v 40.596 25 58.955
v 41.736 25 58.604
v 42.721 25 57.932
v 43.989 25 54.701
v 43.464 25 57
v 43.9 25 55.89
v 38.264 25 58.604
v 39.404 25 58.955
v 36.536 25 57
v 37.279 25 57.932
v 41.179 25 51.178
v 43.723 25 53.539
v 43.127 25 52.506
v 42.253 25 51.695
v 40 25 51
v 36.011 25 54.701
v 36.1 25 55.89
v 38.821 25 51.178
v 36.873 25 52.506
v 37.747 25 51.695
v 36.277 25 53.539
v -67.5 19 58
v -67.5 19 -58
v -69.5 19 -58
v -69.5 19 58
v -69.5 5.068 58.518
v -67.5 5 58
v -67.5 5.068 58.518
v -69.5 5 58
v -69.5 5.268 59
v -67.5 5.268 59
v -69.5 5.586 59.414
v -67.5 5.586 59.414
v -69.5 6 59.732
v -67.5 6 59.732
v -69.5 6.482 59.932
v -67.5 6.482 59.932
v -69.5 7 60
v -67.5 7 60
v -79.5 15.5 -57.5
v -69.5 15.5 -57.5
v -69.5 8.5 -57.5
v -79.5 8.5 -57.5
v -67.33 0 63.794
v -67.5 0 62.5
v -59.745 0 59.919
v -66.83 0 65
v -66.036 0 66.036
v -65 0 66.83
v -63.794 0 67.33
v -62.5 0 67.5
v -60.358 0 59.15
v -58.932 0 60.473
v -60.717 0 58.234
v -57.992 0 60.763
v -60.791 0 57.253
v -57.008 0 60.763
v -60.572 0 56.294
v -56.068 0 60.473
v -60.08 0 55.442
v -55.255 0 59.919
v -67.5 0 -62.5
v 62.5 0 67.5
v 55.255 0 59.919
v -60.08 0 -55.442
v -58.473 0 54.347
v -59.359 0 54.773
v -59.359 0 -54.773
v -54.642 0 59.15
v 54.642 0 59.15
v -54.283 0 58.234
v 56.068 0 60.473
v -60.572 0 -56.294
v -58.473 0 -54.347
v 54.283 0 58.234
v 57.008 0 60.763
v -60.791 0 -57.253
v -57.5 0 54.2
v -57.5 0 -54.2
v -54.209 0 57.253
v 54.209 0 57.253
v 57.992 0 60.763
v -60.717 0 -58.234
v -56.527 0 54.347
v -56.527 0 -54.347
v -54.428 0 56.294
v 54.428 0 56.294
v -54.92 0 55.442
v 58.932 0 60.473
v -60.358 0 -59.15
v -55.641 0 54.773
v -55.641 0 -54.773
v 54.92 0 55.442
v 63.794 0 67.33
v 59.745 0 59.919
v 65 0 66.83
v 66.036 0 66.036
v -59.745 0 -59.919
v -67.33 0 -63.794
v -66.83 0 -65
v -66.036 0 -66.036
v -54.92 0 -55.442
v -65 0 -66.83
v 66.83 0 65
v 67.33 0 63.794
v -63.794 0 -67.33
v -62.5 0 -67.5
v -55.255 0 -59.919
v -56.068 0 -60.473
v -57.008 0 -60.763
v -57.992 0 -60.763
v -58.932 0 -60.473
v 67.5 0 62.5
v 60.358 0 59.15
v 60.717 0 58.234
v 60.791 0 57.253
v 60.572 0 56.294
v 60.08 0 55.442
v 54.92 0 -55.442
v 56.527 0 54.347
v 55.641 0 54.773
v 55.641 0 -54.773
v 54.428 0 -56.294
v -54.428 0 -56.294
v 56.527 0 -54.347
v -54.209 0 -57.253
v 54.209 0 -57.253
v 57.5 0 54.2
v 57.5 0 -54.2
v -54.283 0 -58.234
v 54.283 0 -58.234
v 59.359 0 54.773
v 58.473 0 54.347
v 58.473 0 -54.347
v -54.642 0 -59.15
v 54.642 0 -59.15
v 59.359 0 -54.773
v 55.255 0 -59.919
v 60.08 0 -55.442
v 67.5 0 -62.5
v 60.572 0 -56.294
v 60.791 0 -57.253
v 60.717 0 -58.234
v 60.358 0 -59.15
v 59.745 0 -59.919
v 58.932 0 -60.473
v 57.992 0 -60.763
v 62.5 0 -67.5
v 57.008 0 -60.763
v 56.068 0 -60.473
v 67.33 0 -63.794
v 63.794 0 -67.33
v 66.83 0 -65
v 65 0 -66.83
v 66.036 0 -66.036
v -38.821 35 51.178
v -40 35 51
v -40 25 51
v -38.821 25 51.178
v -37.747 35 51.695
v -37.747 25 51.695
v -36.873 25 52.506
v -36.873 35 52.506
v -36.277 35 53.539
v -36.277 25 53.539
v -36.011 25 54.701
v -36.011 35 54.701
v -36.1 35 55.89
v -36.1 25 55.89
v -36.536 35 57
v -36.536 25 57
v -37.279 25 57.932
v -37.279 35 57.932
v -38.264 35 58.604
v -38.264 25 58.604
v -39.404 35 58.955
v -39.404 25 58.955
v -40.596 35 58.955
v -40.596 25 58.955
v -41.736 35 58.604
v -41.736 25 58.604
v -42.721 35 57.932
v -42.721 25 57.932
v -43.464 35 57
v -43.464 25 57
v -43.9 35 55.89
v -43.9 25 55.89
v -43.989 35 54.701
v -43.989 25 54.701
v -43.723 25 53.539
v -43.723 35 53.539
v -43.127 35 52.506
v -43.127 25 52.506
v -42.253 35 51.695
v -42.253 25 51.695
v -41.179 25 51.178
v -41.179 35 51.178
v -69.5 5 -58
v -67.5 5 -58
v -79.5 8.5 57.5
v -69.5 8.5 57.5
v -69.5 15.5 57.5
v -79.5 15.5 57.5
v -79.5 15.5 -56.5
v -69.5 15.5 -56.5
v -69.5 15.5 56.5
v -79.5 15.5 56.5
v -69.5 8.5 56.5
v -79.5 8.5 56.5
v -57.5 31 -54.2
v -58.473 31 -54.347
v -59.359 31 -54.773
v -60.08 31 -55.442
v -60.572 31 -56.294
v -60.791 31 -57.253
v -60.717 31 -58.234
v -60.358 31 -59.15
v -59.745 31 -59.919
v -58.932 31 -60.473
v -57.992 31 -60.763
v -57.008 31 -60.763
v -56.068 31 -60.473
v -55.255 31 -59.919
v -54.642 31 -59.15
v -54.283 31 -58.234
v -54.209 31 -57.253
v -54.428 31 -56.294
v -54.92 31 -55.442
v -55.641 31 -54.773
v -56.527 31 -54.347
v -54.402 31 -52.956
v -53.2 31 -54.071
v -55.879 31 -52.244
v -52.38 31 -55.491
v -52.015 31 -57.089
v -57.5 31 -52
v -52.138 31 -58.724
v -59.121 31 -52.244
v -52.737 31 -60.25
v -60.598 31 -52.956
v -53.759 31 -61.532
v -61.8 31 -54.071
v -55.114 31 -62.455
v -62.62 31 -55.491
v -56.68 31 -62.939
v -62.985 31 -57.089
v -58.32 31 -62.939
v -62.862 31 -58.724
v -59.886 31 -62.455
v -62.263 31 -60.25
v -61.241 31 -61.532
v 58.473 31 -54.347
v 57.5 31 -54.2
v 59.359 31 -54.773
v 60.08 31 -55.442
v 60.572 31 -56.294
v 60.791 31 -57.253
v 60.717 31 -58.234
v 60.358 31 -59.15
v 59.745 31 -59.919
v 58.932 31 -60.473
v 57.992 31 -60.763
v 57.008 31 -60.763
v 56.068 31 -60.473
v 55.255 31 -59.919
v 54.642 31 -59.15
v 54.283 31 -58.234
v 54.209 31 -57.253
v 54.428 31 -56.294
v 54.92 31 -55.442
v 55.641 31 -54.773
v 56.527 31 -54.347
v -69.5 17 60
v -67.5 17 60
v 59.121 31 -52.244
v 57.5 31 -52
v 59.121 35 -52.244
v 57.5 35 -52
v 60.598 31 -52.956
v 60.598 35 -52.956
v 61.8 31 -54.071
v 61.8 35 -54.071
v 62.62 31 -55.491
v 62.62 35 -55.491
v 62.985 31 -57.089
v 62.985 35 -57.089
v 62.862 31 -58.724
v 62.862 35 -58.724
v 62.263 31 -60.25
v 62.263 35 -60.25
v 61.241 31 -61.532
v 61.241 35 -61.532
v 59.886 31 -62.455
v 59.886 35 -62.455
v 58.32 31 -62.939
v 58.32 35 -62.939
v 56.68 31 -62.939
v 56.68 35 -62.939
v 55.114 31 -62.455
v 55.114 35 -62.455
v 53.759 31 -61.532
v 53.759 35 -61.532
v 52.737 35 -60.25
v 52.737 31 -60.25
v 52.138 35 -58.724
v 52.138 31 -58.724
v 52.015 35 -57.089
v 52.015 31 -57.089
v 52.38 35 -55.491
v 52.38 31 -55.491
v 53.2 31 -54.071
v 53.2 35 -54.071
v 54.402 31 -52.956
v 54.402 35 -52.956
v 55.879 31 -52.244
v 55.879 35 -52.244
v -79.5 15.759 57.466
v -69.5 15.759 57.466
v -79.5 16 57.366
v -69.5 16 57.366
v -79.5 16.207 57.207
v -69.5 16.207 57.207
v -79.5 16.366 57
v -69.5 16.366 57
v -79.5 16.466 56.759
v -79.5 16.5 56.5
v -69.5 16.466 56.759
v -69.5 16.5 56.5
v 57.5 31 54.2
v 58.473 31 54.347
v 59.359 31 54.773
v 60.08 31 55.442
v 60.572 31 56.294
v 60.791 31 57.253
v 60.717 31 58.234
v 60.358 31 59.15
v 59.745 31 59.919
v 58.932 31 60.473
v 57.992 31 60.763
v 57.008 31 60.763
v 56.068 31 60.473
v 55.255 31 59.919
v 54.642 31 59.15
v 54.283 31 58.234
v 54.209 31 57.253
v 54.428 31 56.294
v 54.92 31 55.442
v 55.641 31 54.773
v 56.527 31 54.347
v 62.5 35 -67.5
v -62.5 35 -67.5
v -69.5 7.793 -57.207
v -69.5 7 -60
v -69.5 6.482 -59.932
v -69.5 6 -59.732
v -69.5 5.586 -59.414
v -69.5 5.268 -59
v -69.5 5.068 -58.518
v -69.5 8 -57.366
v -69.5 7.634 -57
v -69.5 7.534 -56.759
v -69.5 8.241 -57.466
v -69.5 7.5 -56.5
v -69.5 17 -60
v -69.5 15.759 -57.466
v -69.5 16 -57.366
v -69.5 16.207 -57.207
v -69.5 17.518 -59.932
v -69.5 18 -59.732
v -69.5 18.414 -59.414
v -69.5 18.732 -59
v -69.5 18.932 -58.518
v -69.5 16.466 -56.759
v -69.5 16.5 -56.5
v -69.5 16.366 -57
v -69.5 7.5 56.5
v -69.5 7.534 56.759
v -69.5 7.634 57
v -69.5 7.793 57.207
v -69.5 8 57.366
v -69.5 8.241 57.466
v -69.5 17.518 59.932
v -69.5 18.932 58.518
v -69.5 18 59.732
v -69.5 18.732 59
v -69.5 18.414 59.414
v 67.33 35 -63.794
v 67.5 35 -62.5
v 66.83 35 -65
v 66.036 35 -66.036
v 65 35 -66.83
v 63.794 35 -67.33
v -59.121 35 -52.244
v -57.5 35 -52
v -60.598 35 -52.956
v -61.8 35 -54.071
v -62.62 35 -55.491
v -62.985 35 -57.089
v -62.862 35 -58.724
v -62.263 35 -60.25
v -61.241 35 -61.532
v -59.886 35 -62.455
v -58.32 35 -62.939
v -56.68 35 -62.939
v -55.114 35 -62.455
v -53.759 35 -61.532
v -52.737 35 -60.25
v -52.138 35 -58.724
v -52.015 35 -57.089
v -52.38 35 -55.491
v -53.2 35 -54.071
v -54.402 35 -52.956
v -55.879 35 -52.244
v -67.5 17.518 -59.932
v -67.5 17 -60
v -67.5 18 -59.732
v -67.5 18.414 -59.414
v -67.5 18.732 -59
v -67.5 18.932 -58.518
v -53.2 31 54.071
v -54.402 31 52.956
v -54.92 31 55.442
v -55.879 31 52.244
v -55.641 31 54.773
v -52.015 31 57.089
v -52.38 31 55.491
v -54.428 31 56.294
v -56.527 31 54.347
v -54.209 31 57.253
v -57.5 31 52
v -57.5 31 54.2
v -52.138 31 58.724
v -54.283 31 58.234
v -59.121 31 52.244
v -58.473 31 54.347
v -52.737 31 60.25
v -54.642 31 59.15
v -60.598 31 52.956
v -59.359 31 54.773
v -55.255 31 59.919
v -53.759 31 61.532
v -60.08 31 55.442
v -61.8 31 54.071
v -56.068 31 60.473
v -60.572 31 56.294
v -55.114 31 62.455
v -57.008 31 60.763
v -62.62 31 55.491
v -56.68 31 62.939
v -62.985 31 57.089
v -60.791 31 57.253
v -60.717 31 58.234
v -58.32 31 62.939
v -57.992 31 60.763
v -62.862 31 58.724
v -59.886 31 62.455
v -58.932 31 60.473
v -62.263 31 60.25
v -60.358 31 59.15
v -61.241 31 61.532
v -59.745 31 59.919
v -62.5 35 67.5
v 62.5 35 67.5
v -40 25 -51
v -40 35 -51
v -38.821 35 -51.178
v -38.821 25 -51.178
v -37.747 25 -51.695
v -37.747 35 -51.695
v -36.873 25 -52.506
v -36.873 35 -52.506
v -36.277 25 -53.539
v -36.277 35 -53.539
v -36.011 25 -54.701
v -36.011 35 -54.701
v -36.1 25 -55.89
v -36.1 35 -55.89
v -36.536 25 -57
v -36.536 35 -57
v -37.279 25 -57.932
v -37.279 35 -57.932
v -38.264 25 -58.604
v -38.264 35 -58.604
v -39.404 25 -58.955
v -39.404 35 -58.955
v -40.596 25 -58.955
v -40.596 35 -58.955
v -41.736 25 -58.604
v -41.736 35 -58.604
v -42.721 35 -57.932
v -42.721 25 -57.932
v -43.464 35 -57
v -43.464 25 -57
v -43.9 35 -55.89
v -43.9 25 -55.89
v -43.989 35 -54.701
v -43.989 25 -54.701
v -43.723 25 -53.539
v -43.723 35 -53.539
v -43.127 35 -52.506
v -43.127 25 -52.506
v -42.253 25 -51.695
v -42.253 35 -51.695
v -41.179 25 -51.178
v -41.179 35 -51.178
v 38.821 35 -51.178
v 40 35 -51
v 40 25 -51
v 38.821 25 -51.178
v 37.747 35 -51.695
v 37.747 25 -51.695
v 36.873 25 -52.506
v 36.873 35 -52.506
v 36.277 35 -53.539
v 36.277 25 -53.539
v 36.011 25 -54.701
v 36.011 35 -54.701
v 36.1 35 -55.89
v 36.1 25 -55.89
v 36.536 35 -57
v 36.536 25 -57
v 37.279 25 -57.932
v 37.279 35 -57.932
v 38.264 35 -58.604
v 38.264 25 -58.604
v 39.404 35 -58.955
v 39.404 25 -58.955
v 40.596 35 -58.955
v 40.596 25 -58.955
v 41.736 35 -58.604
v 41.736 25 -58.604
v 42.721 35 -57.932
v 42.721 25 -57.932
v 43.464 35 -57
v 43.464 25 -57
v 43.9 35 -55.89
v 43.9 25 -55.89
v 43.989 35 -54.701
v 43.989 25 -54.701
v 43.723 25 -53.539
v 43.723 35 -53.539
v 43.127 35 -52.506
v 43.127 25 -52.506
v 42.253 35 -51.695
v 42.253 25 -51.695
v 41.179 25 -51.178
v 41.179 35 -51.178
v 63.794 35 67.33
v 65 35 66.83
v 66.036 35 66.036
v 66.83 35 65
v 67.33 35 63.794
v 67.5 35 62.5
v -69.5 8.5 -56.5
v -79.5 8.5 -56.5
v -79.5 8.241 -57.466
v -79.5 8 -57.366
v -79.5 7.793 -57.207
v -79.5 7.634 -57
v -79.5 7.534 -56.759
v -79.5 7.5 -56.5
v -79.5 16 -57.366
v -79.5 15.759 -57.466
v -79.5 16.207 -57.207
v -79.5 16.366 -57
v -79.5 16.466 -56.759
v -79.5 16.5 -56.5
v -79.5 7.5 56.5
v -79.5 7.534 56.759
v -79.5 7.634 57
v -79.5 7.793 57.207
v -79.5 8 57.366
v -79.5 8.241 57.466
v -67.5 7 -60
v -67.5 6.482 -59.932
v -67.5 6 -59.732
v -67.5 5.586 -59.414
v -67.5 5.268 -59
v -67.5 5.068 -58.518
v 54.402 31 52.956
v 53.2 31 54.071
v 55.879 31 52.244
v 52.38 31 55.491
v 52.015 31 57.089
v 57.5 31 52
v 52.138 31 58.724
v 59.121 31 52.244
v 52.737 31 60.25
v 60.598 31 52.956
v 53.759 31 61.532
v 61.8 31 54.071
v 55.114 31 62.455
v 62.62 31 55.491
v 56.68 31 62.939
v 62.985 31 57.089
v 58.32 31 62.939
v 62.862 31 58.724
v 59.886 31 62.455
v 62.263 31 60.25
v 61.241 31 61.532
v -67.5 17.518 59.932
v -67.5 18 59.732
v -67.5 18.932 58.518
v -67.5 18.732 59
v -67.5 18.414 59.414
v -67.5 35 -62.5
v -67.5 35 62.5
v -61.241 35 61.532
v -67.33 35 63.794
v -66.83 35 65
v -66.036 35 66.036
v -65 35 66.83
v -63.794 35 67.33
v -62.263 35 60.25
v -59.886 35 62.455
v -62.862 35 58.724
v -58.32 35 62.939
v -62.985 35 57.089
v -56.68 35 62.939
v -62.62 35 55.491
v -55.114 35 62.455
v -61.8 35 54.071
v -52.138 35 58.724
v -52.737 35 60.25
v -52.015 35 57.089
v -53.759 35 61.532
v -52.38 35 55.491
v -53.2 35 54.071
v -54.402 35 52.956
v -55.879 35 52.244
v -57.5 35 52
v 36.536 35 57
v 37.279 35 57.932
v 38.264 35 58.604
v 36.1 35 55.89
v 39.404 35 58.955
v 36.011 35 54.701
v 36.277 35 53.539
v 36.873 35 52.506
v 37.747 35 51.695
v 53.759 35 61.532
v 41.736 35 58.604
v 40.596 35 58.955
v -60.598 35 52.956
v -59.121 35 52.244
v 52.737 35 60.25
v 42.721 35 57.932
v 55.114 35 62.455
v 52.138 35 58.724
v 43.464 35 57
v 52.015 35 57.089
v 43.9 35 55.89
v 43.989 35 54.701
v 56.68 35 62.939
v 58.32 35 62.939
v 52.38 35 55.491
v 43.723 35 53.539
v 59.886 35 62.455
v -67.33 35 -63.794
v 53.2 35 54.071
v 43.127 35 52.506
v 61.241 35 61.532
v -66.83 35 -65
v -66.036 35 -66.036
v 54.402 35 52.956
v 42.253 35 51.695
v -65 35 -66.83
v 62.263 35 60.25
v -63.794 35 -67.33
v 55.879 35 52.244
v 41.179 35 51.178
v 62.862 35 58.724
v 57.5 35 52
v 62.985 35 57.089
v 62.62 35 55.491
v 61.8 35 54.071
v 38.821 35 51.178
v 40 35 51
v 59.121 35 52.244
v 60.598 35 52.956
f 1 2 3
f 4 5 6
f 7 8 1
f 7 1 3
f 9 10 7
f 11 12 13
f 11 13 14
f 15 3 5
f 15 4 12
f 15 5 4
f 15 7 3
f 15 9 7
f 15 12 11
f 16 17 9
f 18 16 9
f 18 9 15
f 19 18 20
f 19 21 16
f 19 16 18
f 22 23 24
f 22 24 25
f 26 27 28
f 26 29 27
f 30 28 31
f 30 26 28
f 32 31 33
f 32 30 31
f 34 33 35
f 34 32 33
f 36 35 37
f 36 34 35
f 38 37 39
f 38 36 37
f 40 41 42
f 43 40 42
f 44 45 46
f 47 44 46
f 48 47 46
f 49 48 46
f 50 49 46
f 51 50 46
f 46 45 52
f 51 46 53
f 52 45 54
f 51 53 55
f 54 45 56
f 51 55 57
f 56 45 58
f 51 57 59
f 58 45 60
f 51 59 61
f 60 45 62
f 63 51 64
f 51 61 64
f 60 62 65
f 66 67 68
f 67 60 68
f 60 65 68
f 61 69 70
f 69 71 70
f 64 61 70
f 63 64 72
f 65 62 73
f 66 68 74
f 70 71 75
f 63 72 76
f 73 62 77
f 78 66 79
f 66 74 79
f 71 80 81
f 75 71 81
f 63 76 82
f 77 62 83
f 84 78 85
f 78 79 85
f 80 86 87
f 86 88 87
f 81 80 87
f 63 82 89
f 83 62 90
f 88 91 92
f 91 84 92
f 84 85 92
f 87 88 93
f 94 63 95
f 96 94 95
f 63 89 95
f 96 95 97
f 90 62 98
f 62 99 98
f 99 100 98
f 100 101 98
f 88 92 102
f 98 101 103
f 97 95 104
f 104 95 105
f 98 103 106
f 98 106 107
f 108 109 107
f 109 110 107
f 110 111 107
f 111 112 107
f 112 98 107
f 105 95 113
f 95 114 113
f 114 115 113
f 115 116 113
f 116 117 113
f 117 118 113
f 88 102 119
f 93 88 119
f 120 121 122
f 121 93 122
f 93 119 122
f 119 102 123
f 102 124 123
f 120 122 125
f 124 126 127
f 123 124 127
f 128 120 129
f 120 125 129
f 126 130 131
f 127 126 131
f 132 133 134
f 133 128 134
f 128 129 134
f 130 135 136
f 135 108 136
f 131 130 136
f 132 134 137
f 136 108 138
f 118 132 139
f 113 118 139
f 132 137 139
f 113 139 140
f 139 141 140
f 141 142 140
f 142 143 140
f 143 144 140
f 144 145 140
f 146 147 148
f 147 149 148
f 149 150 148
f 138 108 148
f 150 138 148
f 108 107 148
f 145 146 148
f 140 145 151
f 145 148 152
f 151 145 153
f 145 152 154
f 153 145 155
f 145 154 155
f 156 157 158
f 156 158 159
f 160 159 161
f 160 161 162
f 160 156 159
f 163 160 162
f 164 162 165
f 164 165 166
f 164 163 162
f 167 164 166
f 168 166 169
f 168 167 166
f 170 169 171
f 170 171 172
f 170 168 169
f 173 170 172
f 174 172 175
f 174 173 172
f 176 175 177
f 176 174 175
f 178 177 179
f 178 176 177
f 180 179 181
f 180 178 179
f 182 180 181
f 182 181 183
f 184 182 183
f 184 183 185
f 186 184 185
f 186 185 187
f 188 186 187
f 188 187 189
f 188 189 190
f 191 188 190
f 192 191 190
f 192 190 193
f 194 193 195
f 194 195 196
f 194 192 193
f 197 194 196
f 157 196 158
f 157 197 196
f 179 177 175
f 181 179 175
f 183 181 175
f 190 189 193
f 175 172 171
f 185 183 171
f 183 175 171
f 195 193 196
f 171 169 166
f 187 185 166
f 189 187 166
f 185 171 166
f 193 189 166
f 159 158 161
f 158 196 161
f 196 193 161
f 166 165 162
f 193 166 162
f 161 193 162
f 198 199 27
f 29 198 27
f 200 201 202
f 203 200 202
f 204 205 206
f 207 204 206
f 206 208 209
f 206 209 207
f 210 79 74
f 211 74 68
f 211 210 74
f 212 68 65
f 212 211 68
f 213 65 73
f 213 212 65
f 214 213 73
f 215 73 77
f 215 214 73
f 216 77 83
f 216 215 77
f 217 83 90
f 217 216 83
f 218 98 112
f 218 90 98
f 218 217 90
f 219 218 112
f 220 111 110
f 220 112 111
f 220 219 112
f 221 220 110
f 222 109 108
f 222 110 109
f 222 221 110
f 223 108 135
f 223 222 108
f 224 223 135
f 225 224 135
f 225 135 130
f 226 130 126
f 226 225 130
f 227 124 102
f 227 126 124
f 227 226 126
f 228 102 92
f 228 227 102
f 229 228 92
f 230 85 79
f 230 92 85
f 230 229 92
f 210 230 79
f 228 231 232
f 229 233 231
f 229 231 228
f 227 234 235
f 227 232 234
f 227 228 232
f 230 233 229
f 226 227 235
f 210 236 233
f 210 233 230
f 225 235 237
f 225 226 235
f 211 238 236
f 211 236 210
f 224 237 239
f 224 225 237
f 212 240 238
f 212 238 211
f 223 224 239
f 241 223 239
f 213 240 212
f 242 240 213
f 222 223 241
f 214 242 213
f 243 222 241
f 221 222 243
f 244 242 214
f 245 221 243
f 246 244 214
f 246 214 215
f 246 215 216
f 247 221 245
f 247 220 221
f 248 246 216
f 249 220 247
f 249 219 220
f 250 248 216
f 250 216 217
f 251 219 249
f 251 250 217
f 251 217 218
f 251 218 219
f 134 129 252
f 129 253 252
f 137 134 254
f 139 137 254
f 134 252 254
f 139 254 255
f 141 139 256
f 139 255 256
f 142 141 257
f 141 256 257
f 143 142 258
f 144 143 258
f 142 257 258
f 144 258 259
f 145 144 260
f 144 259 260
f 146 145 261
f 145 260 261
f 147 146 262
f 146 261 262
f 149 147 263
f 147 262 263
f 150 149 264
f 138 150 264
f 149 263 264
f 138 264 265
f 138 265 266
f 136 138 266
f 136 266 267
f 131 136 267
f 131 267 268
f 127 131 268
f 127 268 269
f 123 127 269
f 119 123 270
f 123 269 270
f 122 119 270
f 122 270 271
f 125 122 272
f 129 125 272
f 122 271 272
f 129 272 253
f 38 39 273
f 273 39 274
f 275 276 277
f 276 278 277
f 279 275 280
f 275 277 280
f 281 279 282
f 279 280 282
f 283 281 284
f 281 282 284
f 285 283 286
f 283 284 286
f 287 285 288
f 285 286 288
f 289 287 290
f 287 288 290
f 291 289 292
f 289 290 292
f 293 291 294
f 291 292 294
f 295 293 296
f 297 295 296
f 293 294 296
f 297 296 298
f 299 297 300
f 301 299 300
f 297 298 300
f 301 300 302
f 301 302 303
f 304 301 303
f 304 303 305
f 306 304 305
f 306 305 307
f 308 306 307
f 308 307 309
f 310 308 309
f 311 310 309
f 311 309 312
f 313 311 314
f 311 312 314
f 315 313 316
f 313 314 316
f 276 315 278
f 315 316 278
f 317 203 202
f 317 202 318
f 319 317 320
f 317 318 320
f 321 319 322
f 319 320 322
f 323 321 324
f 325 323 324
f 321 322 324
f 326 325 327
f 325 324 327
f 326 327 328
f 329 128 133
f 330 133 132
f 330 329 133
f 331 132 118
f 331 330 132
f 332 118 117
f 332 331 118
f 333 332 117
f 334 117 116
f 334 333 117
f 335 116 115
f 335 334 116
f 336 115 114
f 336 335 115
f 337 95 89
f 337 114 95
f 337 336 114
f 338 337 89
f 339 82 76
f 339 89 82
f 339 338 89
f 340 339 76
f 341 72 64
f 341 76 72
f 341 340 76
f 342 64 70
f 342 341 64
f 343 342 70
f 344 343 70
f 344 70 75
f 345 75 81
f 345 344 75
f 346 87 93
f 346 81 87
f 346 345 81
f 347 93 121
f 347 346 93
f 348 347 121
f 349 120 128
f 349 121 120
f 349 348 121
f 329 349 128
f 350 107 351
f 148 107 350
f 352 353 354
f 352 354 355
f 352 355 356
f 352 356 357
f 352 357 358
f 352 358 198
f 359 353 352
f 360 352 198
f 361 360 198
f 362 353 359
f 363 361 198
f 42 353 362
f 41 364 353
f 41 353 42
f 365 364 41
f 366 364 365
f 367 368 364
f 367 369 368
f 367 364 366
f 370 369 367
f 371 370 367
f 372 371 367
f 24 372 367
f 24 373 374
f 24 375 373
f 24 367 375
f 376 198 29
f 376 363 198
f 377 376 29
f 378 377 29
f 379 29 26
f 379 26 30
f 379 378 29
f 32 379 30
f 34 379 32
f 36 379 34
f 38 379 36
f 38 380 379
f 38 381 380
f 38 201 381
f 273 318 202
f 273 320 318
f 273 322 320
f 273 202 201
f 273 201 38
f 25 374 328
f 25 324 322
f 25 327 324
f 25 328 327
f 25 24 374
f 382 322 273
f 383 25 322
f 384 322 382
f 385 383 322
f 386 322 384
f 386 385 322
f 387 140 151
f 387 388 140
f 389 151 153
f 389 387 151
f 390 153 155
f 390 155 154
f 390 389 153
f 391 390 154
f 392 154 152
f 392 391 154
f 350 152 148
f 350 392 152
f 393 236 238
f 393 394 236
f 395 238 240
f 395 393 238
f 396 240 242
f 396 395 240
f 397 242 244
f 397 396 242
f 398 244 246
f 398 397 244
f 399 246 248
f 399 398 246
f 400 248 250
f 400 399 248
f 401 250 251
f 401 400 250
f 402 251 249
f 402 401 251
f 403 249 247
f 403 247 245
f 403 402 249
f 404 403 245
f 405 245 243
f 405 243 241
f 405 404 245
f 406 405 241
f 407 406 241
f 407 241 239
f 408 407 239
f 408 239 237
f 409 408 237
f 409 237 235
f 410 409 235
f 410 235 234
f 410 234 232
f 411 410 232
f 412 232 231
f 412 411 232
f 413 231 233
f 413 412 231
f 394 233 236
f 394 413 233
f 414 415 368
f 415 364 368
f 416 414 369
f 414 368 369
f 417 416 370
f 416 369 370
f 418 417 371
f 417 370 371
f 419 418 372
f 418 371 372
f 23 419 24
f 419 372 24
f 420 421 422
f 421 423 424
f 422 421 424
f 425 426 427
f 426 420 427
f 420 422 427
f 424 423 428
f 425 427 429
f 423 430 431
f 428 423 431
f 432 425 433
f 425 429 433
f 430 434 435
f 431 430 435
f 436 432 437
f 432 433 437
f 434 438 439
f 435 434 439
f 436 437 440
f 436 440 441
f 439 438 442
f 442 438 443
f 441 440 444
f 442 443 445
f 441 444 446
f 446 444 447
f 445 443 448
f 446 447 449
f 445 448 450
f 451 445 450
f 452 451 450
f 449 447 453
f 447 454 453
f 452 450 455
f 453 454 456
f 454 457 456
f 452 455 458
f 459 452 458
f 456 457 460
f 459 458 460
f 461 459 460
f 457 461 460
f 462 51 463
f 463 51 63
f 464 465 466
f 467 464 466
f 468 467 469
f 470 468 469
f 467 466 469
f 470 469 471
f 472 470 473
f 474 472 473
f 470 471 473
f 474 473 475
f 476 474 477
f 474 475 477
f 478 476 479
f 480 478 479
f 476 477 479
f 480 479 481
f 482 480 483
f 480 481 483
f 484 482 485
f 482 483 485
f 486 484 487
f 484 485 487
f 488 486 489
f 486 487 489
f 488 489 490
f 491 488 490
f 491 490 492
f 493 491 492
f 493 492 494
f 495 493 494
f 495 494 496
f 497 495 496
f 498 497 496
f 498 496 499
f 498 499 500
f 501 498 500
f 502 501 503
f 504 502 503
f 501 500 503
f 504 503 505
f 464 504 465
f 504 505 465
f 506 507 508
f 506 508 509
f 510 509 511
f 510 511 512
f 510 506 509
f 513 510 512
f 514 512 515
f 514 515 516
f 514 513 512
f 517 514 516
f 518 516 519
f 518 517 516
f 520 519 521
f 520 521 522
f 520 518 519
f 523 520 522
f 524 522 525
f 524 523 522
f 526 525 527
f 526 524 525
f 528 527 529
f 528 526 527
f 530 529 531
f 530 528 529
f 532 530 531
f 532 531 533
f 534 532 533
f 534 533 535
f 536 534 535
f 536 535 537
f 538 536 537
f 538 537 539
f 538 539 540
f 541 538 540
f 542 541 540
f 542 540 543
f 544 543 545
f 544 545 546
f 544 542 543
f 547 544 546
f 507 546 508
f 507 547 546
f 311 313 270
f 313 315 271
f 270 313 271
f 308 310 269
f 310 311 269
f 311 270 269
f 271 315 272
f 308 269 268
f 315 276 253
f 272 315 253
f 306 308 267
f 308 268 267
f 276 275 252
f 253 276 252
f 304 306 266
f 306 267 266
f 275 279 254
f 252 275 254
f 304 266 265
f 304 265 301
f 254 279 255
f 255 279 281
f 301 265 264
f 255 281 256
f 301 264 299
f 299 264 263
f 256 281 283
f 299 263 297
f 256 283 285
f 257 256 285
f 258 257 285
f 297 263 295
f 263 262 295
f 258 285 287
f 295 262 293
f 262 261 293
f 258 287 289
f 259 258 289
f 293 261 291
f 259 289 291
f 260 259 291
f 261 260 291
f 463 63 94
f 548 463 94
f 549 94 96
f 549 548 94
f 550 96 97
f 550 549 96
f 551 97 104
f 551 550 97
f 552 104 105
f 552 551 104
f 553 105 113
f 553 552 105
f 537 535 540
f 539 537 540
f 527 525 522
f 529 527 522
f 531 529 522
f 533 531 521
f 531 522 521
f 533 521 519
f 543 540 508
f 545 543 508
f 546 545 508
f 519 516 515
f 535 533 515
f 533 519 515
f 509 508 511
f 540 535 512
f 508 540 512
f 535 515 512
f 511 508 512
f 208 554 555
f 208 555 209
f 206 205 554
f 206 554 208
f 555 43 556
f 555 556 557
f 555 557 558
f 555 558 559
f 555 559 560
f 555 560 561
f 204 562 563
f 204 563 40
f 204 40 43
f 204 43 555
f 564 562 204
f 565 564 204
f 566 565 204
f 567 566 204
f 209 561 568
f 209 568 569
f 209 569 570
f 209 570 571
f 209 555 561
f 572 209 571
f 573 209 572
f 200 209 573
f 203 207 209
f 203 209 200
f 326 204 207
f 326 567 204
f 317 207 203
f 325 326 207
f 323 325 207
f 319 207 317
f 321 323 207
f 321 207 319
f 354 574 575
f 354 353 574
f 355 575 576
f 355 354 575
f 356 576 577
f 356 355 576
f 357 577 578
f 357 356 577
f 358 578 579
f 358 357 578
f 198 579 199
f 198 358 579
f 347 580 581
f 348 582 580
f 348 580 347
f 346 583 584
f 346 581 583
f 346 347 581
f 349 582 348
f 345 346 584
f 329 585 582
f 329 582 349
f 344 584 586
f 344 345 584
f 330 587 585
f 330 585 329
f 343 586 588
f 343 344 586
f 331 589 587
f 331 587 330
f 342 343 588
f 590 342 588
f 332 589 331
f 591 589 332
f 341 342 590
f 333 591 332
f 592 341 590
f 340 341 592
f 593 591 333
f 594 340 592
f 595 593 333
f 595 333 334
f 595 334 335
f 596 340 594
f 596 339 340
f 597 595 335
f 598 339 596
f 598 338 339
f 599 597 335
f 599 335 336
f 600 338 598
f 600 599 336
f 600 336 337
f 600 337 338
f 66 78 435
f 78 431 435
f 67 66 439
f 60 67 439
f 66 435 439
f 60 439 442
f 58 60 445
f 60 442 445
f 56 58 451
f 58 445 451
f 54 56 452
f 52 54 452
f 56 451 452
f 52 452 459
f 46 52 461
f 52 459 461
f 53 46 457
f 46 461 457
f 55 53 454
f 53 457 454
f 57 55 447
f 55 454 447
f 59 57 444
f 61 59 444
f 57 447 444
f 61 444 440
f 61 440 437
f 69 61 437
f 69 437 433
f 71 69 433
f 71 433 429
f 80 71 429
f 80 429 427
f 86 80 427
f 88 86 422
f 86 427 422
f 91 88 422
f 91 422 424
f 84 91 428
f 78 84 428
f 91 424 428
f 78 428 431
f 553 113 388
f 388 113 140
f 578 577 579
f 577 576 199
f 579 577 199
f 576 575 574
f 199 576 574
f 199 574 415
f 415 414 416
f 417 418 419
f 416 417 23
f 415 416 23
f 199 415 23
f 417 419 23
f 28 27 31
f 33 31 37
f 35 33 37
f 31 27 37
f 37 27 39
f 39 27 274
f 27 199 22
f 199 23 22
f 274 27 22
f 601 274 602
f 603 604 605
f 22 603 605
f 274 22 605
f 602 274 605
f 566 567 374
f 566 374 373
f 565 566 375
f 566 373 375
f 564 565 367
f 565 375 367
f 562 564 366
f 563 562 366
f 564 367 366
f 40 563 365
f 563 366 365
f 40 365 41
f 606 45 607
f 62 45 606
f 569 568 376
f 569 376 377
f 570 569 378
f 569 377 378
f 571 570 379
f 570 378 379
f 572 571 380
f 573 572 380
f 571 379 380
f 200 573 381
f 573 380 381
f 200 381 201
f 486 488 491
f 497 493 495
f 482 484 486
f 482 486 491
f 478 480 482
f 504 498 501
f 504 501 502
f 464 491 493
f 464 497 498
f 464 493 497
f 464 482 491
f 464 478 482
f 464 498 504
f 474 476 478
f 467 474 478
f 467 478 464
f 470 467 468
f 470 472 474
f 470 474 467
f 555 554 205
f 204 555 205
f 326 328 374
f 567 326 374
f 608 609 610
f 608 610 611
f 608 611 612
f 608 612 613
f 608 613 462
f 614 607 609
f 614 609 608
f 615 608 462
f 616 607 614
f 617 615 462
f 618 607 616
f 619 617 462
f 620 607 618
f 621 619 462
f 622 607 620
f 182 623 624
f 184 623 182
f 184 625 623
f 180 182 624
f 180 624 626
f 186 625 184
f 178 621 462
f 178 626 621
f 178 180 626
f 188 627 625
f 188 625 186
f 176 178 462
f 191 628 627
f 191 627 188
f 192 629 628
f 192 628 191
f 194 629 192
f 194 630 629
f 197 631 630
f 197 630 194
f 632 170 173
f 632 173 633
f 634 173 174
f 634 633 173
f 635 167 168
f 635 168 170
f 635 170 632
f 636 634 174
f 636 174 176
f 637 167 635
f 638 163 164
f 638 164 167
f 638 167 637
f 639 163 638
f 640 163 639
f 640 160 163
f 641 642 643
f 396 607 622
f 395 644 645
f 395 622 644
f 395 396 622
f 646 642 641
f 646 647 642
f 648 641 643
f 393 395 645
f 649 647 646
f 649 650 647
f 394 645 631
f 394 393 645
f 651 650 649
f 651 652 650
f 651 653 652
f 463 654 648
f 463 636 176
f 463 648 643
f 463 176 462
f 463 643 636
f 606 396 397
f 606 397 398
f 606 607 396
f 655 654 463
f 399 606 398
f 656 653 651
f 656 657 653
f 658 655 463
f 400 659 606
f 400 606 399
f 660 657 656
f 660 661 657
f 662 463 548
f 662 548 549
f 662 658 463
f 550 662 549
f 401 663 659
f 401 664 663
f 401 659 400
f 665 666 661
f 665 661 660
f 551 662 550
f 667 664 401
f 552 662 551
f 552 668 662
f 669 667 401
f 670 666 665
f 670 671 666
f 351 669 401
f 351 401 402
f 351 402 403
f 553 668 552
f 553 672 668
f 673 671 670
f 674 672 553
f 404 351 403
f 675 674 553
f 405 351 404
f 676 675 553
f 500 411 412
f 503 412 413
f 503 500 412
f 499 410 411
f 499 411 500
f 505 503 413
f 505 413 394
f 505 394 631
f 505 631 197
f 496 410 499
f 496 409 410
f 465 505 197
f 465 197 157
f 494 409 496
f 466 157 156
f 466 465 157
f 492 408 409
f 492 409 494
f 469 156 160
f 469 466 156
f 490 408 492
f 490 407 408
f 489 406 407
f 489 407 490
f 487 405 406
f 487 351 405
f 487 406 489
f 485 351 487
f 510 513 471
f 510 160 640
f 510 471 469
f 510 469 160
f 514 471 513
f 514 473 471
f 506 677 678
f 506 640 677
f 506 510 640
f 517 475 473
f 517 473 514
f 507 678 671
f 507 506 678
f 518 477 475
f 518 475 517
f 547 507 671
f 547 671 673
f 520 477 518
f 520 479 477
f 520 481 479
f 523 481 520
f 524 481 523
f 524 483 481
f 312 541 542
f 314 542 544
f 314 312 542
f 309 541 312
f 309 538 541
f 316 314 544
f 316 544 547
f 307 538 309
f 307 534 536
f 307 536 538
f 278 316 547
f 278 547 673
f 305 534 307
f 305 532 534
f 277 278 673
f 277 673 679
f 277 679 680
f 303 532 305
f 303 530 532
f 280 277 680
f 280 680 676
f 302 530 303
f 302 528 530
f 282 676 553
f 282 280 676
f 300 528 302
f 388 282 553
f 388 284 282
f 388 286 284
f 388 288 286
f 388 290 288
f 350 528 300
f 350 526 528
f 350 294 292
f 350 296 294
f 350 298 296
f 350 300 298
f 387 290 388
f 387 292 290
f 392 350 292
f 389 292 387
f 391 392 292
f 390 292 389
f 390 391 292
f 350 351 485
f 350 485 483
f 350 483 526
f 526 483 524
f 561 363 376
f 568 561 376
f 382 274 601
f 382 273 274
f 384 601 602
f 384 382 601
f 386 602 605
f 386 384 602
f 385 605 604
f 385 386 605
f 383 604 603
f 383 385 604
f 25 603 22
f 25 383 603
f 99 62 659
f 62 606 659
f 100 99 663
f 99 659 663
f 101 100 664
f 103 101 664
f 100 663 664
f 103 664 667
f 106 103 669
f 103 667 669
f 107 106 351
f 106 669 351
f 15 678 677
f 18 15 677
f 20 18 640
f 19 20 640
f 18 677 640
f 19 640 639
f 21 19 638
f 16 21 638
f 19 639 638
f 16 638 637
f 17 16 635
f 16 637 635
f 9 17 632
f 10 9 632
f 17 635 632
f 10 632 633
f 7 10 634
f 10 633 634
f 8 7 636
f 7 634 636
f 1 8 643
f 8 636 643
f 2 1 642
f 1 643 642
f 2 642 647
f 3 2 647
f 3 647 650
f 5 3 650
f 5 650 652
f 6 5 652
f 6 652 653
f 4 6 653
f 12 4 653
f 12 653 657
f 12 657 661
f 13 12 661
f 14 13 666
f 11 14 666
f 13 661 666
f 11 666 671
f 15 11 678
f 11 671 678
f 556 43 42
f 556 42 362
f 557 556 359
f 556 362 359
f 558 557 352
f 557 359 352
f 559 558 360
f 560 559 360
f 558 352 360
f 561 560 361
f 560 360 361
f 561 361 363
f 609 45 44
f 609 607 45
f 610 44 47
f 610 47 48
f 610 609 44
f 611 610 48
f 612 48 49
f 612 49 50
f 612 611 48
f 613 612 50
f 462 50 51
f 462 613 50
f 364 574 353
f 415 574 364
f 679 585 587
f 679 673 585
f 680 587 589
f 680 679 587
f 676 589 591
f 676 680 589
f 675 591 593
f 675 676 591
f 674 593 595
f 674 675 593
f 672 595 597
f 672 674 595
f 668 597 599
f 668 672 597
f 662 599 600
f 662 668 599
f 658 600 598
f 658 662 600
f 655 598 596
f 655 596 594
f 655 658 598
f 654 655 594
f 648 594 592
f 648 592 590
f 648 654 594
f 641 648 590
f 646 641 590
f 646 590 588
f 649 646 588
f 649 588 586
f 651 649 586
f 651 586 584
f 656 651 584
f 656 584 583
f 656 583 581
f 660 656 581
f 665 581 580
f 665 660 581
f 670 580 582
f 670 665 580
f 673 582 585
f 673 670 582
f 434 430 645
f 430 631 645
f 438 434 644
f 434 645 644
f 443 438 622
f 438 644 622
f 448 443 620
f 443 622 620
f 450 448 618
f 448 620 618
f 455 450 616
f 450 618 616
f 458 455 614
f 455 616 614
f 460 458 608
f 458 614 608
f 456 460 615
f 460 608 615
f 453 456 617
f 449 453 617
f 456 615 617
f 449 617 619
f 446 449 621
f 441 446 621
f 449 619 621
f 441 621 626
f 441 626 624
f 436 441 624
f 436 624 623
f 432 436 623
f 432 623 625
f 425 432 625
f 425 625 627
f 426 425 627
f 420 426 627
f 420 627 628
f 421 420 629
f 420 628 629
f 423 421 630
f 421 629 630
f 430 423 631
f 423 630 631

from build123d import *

# Parameters (mm, degrees)
SKETCH2_W               = 135
SKETCH2_H               = 135
BOSS_EXTRUDE1_DEPTH     = 35
FILLET1_R               = 5
SKETCH7_W               = 120
SKETCH7_H               = 14
BOSS_EXTRUDE2_DEPTH     = 2
FILLET2_R               = 2
SKETCH9_W               = 113
SKETCH9_H               = 7
BOSS_EXTRUDE3_DEPTH     = 10
SKETCH12_R              = 4
CUT_EXTRUDE1_DEPTH      = 10
MIRROR4_COPY_2_SKETCH_R = 4
MIRROR4_COPY_2_DEPTH    = 10
MIRROR4_COPY_4_SKETCH_R = 4
MIRROR4_COPY_4_DEPTH    = 10


with BuildPart() as part:
    # Sketch2 → Boss-Extrude1 (new body)
    with BuildSketch(Plane(origin=(0, 0, 0), x_dir=(1, 0, 0), z_dir=(0, 1, 0))):
        Rectangle(SKETCH2_W, SKETCH2_H)
    extrude(amount=BOSS_EXTRUDE1_DEPTH)

    # Fillet1
    fillet1_edges = [part.edges().sort_by_distance(p)[0] for p in [
        (67.5, 17.5, -67.5),
        (67.5, 17.5, 67.5),
        (-67.5, 17.5, 67.5),
        (-67.5, 17.5, -67.5),
    ]]
    fillet(fillet1_edges, radius=FILLET1_R)

    # Sketch6 → CBORE for M6 Hex Head Bolt1 (revolve, cut)
    with BuildSketch(Plane(origin=(-57.5, 35, -57.5), x_dir=(0, 0, 1), z_dir=(1, 0, 0))):
        Polygon((0, 0), (0, 43.982840043), (3.3, 42), (3.3, 4), (5.5, 4), (5.5, 0), align=None)
    cbore_for_m6_hex_head_bolt1 = revolve(axis=Axis((-57.5, 41.35, -57.5), (0, -1, 0)), mode=Mode.SUBTRACT)

    # Sketch12 → Cut-Extrude1 (cut)
    with BuildSketch(Plane(origin=(0, 35, 0), x_dir=(1, 0, 0), z_dir=(0, 1, 0))):
        with Locations((-40, 55)):
            Circle(SKETCH12_R)
    cut_extrude1 = extrude(amount=-CUT_EXTRUDE1_DEPTH, mode=Mode.SUBTRACT)

    # Mirror3: CBORE for M6 Hex Head Bolt1, Cut-Extrude1 across plane
    add(cbore_for_m6_hex_head_bolt1.mirror(Plane.XY), mode=Mode.SUBTRACT)
    add(cut_extrude1.mirror(Plane.XY), mode=Mode.SUBTRACT)

    # Mirror4 copy 1 sketch → Mirror4 copy 1 (revolve, cut)
    with BuildSketch(Plane(origin=(57.5, 35, 57.5), x_dir=(0, 0, -1), z_dir=(-1, 0, 0))):
        Polygon((0, 0), (0, 43.982840043), (3.3, 42), (3.3, 4), (5.5, 4), (5.5, 0), align=None)
    revolve(axis=Axis((57.5, 41.35, 57.5), (0, -1, 0)), mode=Mode.SUBTRACT)

    # Mirror4 copy 2 sketch → Mirror4 copy 2 (cut)
    with BuildSketch(Plane(origin=(0, 35, 0), x_dir=(-1, 0, 0), z_dir=(0, 1, 0))):
        with Locations((-40, 55)):
            Circle(MIRROR4_COPY_2_SKETCH_R)
    extrude(amount=-MIRROR4_COPY_2_DEPTH, mode=Mode.SUBTRACT)

    # Mirror4 copy 3 sketch → Mirror4 copy 3 (revolve, cut)
    with BuildSketch(Plane(origin=(57.5, 35, -57.5), x_dir=(0, 0, 1), z_dir=(-1, 0, 0))):
        Polygon((0, 0), (0, -43.982840043), (3.3, -42), (3.3, -4), (5.5, -4), (5.5, 0), align=None)
    revolve(axis=Axis((57.5, 41.35, -57.5), (0, 1, 0)), mode=Mode.SUBTRACT)

    # Mirror4 copy 4 sketch → Mirror4 copy 4 (cut)
    with BuildSketch(Plane(origin=(0, 35, 0), x_dir=(-1, 0, 0), z_dir=(0, 1, 0))):
        with Locations((-40, -55)):
            Circle(MIRROR4_COPY_4_SKETCH_R)
    extrude(amount=-MIRROR4_COPY_4_DEPTH, mode=Mode.SUBTRACT)


with BuildPart() as body_2:
    # Sketch7 → Boss-Extrude2 (new body)
    with BuildSketch(Plane.ZY.offset(67.5)):
        with Locations((0, 12)):
            Rectangle(SKETCH7_W, SKETCH7_H)
    extrude(amount=BOSS_EXTRUDE2_DEPTH)

    # Fillet2
    fillet2_edges = [body_2.edges().sort_by_distance(p)[0] for p in [
        (-68.5, 5, -60),
        (-68.5, 5, 60),
        (-68.5, 19, 60),
        (-68.5, 19, -60),
    ]]
    fillet(fillet2_edges, radius=FILLET2_R)

    # Sketch9 → Boss-Extrude3 (add)
    with BuildSketch(Plane.ZY.offset(69.5)):
        with BuildLine():
            Line((56.5, 16.5), (-56.5, 16.5))
            ThreePointArc((-56.5, 16.5), (-57.207106781, 16.207106781), (-57.5, 15.5))
            Line((-57.5, 15.5), (-57.5, 8.5))
            ThreePointArc((-57.5, 8.5), (-57.207106781, 7.792893219), (-56.5, 7.5))
            Line((-56.5, 7.5), (56.5, 7.5))
            ThreePointArc((56.5, 7.5), (57.207106781, 7.792893219), (57.5, 8.5))
            Line((57.5, 8.5), (57.5, 15.5))
            ThreePointArc((57.5, 15.5), (57.207106781, 16.207106781), (56.5, 16.5))
        make_face()
        with Locations((0, 12)):
            Rectangle(SKETCH9_W, SKETCH9_H, mode=Mode.SUBTRACT)
    extrude(amount=BOSS_EXTRUDE3_DEPTH)


solid = Compound([part.part, body_2.part])
